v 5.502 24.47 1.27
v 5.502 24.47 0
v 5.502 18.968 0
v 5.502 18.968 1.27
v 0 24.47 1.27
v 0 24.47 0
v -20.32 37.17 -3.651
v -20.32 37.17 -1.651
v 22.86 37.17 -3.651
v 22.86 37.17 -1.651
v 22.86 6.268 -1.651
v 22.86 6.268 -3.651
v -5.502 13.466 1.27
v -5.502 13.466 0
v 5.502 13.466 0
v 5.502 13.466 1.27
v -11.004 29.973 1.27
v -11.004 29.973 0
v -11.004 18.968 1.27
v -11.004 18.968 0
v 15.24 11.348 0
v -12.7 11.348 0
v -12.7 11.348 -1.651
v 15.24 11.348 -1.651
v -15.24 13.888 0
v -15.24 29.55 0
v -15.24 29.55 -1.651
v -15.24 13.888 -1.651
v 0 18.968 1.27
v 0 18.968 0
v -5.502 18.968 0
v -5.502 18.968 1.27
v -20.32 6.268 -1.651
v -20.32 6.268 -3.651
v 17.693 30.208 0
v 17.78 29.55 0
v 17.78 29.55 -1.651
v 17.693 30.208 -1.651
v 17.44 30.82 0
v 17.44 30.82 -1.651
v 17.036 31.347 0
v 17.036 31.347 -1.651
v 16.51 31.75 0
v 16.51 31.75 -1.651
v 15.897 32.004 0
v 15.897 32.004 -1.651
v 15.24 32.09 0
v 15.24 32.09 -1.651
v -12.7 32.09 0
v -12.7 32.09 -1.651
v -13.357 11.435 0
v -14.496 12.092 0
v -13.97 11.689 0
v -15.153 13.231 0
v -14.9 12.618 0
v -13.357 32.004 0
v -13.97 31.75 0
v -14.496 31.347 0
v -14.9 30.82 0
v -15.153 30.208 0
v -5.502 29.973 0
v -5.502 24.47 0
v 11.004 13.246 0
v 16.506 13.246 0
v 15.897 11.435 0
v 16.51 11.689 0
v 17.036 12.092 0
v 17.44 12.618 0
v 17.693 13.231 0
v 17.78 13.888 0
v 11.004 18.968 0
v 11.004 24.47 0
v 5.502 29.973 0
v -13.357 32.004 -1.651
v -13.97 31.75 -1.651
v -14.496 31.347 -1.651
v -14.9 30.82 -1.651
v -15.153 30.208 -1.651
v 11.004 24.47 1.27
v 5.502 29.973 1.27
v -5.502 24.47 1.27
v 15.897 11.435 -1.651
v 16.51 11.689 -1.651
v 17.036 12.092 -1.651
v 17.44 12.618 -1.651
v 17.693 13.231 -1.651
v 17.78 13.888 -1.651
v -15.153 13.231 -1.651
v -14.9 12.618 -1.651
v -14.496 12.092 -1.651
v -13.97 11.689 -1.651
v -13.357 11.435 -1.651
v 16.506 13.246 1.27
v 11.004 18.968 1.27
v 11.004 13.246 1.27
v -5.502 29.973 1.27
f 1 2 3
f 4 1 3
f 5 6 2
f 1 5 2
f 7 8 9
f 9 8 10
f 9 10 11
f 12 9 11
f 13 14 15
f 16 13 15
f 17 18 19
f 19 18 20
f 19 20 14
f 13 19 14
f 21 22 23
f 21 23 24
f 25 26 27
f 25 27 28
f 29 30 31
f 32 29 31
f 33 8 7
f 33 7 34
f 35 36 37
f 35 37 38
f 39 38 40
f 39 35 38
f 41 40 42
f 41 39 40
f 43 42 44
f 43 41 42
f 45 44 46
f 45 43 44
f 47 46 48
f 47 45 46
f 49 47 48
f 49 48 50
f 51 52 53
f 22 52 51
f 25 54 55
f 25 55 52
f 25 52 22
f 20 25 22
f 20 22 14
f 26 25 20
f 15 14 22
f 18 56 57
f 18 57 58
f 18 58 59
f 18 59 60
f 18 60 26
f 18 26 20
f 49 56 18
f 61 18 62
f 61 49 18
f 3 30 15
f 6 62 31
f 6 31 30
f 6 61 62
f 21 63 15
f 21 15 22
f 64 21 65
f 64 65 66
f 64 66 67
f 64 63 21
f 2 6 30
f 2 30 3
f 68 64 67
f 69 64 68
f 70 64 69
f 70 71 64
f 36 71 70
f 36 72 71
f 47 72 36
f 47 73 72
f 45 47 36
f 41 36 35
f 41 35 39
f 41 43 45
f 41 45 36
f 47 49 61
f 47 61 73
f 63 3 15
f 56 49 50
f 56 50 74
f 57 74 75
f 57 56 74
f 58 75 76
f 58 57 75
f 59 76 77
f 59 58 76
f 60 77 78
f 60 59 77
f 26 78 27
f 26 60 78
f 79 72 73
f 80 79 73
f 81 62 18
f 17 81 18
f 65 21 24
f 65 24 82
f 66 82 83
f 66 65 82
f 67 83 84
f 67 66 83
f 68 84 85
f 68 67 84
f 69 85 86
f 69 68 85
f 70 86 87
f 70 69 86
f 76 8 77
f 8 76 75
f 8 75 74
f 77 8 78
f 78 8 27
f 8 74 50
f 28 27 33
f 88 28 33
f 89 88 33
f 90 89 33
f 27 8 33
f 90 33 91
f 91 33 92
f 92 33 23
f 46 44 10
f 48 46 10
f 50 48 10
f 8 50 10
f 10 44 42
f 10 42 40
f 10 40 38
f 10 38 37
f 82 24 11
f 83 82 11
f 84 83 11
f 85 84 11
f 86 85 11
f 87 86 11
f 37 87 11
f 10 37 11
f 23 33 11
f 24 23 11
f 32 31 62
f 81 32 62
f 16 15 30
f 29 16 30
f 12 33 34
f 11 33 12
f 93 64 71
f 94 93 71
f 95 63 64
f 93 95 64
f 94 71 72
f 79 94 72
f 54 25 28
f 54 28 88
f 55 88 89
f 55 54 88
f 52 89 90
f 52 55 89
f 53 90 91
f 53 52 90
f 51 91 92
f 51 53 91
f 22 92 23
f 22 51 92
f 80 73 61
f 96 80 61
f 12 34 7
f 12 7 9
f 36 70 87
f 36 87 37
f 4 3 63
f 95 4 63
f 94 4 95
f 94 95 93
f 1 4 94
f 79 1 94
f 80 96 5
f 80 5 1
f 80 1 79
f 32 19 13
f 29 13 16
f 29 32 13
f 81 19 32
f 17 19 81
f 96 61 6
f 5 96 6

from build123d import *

# Parameters (mm, degrees)
F3_DEPTH = 1.651
F4_DEPTH = 1.27
F5_W     = 43.18
F5_H     = 30.902041302
F6_DEPTH = 2


with BuildPart() as f3:
    # F2 (on face) → F3 (new body)
    with BuildSketch(Plane.XY):
        with BuildLine():
            Line((15.24, 32.0904812722), (-12.7, 32.0904812722))
            ThreePointArc((-12.7, 32.0904812722), (-14.4960512242, 31.3465324964), (-15.24, 29.5504812722))
            Line((-15.24, 29.5504812722), (-15.24, 13.8884399702))
            ThreePointArc((-15.24, 13.8884399702), (-14.4960512242, 12.092388746), (-12.7, 11.3484399702))
            Line((-12.7, 11.3484399702), (15.24, 11.3484399702))
            ThreePointArc((15.24, 11.3484399702), (17.0360512242, 12.092388746), (17.78, 13.8884399702))
            Line((17.78, 13.8884399702), (17.78, 29.5504812722))
            ThreePointArc((17.78, 29.5504812722), (17.0360512242, 31.3465324964), (15.24, 32.0904812722))
        make_face()
    extrude(amount=-F3_DEPTH)

    # F1 (on face) → F4 (join)
    with BuildSketch(Plane.XY):
        Polygon((-5.502041302, 24.4704812722), (-11.0040826039, 29.9725225741), (-11.0040826039, 18.9684399702), (-5.502041302, 13.4663986682), (5.502041302, 13.4663986682), (0, 18.9684399702), (-5.502041302, 18.9684399702), align=None)
        Polygon((5.502041302, 29.9725225741), (-5.502041302, 29.9725225741), (0, 24.4704812722), (5.502041302, 24.4704812722), (5.502041302, 18.9684399702), (11.0040826039, 13.245652739), (16.5061239059, 13.245652739), (11.0040826039, 18.9684399702), (11.0040826039, 24.4704812722), align=None)
    extrude(amount=F4_DEPTH)

    # F5 (on face) → F6 (join)
    with BuildSketch(Plane(origin=(0, 0, -1.651), x_dir=(1, 0, 0), z_dir=(0, 0, -1))):
        with Locations((1.27, -21.7194606212)):
            Rectangle(F5_W, F5_H)
    extrude(amount=F6_DEPTH)


solid = f3.part
